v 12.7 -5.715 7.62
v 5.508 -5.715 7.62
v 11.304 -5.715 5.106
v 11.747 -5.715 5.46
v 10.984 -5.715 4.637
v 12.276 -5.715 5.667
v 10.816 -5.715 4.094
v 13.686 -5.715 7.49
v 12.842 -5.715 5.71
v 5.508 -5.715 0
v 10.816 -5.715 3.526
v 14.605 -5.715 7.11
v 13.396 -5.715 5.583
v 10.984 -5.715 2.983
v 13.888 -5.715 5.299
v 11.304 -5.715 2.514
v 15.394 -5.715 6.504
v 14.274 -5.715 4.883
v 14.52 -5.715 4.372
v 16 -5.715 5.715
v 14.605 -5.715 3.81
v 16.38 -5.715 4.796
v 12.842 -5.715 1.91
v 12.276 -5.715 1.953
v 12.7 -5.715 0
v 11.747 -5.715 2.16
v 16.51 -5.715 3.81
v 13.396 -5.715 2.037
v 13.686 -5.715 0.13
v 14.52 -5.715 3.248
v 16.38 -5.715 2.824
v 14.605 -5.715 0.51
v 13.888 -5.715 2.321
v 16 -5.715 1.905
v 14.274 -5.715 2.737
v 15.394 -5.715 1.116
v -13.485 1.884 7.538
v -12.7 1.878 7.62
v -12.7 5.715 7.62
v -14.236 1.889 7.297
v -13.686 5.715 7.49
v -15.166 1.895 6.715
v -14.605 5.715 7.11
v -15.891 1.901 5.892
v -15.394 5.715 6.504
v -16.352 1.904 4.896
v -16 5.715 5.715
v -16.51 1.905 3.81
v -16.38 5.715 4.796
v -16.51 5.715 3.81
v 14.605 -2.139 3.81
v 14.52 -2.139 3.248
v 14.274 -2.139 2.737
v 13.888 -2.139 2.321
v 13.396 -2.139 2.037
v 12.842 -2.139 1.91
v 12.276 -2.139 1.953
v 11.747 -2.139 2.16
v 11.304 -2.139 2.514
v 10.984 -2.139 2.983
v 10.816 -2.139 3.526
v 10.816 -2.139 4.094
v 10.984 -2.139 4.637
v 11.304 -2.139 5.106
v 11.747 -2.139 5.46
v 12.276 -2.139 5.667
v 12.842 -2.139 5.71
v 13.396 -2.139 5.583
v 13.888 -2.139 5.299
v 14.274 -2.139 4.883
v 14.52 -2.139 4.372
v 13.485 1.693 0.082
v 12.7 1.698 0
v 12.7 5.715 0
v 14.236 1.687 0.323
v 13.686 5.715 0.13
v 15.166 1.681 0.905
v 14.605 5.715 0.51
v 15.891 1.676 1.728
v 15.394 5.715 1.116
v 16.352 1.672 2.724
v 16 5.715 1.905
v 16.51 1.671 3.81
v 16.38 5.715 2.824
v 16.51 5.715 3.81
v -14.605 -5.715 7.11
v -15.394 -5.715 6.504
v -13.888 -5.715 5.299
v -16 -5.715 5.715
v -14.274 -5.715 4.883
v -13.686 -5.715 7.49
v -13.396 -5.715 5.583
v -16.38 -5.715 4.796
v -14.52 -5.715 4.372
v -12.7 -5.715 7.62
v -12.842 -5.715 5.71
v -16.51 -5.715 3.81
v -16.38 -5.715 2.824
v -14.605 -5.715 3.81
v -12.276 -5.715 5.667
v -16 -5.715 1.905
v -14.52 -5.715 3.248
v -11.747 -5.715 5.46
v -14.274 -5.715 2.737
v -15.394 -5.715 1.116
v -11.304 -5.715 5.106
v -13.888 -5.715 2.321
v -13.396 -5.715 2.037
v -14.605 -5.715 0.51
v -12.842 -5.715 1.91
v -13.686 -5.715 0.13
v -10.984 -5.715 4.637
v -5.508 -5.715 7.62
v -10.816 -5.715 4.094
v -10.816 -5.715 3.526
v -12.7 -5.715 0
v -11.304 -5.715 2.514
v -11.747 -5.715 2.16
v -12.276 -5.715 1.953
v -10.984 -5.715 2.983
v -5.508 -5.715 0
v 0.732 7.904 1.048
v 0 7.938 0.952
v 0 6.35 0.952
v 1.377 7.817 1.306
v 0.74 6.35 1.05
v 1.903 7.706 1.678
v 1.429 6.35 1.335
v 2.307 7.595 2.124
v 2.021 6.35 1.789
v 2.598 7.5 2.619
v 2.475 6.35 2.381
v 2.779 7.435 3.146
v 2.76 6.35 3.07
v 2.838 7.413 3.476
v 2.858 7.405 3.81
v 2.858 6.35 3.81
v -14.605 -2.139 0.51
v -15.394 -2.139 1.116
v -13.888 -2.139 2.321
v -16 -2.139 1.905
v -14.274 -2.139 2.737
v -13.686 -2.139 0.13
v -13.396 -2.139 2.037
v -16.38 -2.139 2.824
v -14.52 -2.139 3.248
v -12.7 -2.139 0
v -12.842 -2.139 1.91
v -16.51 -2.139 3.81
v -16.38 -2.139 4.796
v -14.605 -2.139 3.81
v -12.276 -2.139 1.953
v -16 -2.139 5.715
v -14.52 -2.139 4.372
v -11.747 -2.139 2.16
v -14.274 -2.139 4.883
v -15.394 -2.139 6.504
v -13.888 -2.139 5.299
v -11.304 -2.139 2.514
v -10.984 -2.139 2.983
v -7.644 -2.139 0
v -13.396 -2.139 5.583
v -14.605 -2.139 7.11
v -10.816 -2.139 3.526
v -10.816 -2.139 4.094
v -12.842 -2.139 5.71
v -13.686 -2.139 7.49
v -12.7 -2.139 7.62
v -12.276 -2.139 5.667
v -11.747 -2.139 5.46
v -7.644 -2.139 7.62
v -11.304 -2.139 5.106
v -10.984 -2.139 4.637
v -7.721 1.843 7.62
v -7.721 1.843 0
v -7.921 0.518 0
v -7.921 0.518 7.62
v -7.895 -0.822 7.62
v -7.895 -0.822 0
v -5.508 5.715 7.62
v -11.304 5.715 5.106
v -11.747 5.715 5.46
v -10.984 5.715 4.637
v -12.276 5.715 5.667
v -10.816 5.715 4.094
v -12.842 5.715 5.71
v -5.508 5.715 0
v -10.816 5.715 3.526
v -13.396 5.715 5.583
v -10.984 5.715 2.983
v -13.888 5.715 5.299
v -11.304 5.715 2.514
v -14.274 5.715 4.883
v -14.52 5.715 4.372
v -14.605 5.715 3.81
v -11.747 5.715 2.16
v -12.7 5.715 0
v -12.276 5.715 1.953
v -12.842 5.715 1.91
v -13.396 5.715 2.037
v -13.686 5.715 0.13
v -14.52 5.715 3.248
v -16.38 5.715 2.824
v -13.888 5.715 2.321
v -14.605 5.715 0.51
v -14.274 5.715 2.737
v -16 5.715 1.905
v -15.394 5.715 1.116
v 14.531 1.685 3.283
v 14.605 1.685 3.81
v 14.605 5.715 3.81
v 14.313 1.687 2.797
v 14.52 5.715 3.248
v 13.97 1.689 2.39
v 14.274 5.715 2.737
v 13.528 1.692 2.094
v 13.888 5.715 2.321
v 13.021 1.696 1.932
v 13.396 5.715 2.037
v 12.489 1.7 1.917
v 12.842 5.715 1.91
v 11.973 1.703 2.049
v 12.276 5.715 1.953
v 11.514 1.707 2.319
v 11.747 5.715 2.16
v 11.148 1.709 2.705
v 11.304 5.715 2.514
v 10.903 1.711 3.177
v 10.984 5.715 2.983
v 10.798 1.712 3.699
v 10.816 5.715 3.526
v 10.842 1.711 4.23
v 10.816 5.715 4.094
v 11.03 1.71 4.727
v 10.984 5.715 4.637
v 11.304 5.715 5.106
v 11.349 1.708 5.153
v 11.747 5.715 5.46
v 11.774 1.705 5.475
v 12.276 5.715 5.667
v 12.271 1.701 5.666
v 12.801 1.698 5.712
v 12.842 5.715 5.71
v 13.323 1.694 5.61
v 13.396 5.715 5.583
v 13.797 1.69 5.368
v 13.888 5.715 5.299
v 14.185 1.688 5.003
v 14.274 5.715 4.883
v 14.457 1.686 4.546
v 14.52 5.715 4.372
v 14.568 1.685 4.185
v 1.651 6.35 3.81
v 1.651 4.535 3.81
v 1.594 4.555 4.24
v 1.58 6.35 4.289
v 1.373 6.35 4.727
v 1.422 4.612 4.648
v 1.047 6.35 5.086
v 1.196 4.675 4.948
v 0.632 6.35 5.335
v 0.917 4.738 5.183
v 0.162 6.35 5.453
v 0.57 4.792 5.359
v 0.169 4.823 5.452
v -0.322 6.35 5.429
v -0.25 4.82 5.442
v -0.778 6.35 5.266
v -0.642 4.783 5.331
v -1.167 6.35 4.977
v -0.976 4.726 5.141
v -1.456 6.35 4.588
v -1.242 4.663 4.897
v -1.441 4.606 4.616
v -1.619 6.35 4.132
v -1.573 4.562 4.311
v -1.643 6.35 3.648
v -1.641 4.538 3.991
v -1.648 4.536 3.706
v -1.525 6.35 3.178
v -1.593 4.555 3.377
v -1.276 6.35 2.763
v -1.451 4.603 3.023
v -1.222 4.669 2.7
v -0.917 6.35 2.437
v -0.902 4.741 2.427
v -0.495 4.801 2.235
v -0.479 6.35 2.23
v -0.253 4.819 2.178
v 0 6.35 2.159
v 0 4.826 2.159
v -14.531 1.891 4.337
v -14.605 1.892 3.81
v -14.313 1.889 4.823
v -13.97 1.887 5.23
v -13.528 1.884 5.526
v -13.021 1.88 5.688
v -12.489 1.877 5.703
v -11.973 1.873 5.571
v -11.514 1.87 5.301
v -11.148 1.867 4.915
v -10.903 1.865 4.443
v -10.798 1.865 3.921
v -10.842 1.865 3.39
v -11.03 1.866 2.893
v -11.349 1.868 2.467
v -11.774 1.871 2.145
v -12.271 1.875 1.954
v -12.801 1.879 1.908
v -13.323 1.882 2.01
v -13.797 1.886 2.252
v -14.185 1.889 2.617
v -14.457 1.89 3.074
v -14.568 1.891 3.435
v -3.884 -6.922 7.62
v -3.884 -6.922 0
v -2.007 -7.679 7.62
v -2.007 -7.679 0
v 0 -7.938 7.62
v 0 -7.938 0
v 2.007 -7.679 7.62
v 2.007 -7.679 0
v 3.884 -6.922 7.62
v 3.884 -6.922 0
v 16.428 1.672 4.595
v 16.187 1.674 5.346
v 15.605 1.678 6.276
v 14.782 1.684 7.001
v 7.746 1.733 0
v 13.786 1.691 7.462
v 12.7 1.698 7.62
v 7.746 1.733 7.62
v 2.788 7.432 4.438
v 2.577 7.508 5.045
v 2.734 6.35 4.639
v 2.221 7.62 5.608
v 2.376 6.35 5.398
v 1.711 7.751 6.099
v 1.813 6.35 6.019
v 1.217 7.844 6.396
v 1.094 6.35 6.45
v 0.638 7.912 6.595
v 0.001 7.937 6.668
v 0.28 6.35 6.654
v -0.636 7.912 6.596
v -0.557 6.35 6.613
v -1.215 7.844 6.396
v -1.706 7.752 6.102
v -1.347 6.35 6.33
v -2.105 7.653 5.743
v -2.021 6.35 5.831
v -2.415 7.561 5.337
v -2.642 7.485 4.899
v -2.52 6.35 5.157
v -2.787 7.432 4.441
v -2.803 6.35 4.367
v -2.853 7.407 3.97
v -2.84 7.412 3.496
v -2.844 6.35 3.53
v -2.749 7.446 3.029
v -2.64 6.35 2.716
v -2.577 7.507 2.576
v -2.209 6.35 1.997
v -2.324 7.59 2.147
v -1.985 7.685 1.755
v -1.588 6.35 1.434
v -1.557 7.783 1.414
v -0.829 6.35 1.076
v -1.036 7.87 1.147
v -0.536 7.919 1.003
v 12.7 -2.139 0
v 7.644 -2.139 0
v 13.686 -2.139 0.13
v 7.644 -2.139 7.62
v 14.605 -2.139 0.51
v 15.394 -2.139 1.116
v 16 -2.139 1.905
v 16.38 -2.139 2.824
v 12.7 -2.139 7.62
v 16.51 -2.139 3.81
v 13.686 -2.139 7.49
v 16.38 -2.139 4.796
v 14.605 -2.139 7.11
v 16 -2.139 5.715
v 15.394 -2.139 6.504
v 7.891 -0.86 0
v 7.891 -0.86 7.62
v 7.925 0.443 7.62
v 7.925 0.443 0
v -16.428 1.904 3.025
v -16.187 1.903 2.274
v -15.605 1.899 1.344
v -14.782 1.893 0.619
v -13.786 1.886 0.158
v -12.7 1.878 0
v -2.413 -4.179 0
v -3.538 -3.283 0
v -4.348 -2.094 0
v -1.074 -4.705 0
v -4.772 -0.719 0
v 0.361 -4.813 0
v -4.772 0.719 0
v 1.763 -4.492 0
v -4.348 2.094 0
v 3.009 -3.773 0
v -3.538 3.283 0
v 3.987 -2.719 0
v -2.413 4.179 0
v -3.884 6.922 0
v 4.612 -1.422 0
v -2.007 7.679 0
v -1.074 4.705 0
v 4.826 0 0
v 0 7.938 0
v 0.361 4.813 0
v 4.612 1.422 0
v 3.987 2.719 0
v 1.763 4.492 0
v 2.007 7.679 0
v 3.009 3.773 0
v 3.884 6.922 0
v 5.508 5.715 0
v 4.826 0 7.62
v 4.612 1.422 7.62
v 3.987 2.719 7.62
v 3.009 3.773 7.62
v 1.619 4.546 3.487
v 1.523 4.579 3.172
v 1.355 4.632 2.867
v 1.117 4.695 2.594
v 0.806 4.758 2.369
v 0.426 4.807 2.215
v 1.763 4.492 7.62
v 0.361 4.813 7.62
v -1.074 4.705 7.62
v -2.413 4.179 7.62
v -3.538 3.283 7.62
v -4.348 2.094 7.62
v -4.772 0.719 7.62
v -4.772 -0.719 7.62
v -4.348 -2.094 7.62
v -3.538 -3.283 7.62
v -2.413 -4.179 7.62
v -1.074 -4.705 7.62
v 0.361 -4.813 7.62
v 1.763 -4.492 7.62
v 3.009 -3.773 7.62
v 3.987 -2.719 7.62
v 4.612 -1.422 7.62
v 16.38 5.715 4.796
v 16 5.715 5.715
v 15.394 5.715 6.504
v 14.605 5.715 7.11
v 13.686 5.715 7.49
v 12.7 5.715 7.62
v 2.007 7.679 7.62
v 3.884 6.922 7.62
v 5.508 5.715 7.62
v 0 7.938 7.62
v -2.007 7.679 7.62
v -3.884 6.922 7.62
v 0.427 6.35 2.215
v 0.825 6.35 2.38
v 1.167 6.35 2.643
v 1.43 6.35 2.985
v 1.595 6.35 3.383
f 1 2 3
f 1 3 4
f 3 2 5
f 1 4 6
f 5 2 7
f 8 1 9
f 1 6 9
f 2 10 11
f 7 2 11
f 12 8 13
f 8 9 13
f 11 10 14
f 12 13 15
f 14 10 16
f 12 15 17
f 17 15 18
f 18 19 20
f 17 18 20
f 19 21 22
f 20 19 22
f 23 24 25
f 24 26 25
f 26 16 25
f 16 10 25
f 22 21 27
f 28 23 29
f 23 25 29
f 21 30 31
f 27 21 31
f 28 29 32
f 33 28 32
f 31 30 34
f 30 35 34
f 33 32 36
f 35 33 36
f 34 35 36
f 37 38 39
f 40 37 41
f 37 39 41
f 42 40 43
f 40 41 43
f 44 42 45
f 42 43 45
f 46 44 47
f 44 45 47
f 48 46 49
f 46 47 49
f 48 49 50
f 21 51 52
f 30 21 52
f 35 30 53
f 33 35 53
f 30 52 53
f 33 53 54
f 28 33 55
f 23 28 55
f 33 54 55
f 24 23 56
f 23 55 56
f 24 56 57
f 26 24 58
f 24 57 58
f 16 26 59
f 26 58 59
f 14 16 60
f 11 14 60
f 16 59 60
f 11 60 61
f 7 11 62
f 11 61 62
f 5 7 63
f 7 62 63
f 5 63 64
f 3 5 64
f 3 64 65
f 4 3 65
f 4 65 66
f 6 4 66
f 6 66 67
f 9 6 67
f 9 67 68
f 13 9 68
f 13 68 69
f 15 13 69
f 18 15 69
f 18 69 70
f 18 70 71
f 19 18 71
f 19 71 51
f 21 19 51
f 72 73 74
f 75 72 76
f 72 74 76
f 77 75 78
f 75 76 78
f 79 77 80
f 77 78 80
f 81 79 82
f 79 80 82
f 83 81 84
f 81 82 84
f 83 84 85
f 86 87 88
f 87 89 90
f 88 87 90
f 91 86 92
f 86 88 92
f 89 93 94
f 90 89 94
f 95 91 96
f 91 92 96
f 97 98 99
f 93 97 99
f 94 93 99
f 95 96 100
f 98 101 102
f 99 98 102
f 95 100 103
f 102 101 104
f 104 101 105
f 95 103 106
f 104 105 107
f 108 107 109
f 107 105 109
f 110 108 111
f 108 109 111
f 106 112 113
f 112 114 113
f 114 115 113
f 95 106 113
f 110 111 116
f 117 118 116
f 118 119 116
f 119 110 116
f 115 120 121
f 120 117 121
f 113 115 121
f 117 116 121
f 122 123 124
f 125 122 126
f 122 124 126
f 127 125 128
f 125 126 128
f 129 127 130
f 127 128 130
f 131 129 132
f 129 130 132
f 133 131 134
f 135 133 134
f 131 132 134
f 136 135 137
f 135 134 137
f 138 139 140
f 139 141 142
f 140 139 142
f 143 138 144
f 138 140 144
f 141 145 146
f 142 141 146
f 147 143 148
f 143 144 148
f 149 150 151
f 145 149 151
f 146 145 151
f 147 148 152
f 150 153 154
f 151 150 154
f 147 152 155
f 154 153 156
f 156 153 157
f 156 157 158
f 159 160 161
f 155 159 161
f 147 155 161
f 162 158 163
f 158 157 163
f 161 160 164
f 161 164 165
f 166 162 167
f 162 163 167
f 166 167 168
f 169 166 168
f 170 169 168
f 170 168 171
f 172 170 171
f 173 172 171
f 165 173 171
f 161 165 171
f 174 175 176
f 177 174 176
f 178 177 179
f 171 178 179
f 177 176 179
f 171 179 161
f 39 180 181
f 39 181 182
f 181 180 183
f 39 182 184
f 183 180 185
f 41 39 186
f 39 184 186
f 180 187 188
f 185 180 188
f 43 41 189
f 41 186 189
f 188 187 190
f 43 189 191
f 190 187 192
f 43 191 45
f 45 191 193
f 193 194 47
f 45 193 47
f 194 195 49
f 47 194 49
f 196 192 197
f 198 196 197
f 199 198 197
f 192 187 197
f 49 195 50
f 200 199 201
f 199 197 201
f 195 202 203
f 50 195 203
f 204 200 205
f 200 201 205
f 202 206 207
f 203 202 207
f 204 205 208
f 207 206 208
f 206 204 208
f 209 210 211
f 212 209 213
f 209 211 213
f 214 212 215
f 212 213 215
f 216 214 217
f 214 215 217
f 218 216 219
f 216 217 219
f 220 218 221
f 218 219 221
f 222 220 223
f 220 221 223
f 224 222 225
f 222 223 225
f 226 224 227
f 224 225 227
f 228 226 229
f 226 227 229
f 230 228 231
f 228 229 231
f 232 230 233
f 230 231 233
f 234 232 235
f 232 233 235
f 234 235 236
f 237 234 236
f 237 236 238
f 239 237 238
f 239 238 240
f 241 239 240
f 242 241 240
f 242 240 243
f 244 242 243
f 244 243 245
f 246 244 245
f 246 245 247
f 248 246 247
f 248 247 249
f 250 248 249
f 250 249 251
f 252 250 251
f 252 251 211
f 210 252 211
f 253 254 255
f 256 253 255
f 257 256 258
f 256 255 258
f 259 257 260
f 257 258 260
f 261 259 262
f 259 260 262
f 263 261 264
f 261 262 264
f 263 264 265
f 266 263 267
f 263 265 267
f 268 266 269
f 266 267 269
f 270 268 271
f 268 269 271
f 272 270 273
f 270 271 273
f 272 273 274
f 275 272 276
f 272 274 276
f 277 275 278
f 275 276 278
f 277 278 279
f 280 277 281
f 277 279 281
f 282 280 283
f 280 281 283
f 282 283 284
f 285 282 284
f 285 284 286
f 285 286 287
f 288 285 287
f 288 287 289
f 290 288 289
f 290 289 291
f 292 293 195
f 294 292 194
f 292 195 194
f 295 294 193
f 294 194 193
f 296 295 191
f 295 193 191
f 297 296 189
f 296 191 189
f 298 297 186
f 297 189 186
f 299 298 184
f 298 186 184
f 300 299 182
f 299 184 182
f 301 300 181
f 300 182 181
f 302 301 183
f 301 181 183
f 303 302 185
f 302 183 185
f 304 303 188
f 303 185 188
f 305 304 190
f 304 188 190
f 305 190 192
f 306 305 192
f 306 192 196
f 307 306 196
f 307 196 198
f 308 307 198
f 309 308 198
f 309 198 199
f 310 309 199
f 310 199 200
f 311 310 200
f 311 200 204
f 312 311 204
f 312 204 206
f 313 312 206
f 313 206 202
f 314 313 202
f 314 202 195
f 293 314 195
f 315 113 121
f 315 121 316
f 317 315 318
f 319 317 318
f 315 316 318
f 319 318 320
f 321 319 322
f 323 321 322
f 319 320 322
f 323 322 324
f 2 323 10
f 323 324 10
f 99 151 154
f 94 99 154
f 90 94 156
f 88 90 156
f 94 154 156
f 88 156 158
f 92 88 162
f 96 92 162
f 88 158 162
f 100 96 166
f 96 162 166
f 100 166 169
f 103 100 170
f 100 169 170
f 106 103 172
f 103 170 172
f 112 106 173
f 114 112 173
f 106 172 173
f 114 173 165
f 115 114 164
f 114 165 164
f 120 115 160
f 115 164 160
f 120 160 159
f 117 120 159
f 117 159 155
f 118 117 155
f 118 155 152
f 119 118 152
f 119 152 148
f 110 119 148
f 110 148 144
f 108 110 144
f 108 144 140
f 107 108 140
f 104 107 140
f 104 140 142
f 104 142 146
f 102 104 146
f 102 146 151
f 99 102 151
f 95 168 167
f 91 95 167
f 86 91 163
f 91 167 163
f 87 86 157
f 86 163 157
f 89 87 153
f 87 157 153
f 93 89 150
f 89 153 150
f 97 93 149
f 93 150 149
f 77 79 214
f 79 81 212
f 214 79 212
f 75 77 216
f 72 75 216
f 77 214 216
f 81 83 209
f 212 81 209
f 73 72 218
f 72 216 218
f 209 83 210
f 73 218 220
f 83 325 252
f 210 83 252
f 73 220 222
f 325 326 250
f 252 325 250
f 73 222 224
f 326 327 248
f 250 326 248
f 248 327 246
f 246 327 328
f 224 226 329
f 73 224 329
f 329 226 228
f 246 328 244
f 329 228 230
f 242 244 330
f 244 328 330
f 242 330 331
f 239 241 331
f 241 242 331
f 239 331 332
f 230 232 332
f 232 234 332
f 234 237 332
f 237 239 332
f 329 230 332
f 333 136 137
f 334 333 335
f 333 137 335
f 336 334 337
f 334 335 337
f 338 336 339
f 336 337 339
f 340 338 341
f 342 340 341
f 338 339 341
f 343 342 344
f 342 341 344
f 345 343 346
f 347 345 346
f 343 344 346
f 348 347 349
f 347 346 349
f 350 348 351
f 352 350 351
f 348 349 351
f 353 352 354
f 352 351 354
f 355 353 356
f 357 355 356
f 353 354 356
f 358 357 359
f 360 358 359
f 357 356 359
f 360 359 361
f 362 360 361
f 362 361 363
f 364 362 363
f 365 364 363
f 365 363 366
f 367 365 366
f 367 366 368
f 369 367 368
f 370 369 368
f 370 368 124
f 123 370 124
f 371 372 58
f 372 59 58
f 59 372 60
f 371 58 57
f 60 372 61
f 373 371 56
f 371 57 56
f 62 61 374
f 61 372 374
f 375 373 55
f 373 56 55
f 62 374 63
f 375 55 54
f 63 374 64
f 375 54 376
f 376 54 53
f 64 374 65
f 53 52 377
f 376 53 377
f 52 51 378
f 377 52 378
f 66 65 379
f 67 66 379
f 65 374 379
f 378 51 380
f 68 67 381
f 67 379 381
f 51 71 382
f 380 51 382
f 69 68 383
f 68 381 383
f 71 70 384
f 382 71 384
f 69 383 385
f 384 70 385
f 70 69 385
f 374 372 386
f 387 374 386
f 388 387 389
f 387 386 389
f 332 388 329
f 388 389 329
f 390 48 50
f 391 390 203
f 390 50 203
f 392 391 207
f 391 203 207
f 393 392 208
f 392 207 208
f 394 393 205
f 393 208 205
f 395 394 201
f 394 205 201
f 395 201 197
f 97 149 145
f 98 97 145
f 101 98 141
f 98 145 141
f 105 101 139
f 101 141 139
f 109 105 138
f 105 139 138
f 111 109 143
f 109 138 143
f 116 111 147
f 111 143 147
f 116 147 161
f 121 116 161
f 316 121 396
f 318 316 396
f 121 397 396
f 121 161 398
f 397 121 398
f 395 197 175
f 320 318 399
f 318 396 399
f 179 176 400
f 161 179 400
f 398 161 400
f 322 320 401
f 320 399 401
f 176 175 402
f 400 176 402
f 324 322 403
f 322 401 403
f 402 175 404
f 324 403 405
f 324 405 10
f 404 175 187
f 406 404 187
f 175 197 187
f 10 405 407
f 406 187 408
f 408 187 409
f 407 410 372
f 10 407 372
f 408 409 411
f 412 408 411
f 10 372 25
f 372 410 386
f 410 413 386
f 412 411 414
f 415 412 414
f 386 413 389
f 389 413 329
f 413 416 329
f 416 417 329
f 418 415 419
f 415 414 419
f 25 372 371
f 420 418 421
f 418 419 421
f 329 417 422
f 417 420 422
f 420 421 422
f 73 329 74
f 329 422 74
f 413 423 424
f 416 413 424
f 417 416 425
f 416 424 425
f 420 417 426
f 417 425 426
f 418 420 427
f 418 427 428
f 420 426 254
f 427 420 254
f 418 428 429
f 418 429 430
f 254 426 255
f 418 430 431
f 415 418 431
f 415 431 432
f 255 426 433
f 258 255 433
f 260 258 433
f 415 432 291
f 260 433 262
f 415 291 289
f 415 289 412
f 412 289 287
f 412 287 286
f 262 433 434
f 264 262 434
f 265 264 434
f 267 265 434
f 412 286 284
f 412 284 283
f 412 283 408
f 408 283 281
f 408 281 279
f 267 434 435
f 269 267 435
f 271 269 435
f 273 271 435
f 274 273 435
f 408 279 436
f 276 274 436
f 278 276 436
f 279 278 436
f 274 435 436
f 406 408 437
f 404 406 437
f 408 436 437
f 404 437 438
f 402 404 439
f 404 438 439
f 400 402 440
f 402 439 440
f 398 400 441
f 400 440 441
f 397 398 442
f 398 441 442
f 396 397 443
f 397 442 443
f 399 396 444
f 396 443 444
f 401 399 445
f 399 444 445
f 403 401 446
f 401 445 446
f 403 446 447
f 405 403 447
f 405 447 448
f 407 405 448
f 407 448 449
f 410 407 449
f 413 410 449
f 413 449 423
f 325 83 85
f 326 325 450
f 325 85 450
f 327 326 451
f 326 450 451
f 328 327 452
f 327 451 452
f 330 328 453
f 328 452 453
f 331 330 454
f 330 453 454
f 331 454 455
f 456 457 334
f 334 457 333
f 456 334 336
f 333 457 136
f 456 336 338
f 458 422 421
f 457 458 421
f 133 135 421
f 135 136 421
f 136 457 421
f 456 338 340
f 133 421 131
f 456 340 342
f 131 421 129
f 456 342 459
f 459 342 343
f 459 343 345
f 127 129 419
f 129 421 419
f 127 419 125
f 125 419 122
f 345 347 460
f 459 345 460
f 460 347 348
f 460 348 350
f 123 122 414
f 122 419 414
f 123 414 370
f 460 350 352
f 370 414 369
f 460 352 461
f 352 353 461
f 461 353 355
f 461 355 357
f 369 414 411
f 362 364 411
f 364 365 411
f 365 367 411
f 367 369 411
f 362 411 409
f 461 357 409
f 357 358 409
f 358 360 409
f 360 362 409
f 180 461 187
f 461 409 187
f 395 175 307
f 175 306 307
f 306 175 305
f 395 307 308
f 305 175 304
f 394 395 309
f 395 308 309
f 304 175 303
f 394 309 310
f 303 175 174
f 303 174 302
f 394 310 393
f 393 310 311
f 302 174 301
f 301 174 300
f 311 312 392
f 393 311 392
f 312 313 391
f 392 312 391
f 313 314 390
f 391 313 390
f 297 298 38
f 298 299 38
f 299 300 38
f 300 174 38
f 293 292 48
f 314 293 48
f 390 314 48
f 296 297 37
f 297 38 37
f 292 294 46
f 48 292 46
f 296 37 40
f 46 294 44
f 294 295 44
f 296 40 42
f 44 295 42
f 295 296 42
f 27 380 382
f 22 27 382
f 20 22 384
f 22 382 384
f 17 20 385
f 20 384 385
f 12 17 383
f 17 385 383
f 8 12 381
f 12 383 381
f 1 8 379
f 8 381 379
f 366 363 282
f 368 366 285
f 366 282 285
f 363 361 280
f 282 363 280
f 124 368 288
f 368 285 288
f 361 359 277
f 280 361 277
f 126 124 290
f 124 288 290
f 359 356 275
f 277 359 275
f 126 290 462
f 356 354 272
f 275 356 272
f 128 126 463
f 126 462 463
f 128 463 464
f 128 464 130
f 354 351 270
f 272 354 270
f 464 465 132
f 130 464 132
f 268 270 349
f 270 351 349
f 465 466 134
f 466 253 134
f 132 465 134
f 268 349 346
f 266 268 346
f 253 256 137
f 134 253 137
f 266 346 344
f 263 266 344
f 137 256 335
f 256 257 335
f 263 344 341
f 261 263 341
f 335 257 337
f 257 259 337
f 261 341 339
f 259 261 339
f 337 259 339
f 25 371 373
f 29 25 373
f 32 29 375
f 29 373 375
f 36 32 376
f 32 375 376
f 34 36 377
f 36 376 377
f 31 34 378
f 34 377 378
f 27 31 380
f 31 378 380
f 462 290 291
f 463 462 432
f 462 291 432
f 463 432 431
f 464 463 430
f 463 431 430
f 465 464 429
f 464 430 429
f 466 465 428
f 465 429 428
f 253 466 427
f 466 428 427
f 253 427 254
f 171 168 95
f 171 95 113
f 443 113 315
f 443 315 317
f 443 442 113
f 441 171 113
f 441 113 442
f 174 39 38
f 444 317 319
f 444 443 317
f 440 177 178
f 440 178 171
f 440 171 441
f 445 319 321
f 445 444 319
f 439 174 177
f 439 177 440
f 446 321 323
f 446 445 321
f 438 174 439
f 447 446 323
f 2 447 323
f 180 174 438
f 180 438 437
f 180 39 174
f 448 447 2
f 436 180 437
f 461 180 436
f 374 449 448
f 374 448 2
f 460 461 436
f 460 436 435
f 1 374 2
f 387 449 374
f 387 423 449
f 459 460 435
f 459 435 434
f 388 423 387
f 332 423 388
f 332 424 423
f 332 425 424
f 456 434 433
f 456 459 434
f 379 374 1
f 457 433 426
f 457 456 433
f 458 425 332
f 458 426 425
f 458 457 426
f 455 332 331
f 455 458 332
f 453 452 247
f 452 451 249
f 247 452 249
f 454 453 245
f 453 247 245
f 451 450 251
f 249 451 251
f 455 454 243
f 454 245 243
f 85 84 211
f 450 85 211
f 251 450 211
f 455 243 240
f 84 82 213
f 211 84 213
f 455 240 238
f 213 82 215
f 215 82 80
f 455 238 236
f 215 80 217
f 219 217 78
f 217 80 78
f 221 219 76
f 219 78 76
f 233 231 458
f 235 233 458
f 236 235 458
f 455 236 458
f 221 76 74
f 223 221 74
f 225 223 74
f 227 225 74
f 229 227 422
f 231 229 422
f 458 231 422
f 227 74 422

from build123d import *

# Parameters (mm, degrees)
F1_DEPTH  = 7.62
F3_DEPTH  = 7.62
F4_R      = 1.905
F5_DEPTH  = 11.431
F6_R      = 7.9375
F7_DEPTH  = 7.62
F8_R      = 4.826
F9_DEPTH  = 25.4
F11_DEPTH = 25.4
F14_DEPTH = 25.4


with BuildPart() as f1:
    # F0 (on Top) → F1 (new body)
    with BuildSketch(Plane.XY):
        Polygon((-16.51, -5.715), (0, -5.715), (16.51, -5.715), (16.51, 5.715), (-16.51, 5.715), align=None)
    extrude(amount=F1_DEPTH)

    # F2 (on face) → F3 (cut)
    with BuildSketch(Plane.XY.offset(7.62)):
        Polygon((-16.51, 1.905), (-16.51, 0), (-16.51, -2.138732), (16.51, -2.138732), (16.51, 1.671268), align=None)
    extrude(amount=-F3_DEPTH, mode=Mode.SUBTRACT)

    # F4 (on face) → F5 (cut, through all)
    with BuildSketch(Plane(origin=(0, 5.715, 0), x_dir=(-1, 0, 0), z_dir=(0, 1, 0))):
        with Locations((12.7, 3.81)):
            Circle(F4_R)
        with BuildLine():
            Line((16.51, 0), (16.51, 3.81))
            ThreePointArc((16.51, 3.81), (15.394077, 1.115923), (12.7, 0))
            Line((12.7, 0), (16.51, 0))
        make_face()
        with BuildLine():
            ThreePointArc((12.7, 7.62), (15.394077, 6.504077), (16.51, 3.81))
            Line((16.51, 3.81), (16.51, 7.62))
            Line((16.51, 7.62), (12.7, 7.62))
        make_face()
        with BuildLine():
            ThreePointArc((-10.795, 3.81), (-12.7, 5.715), (-14.605, 3.81))
            ThreePointArc((-14.605, 3.81), (-12.7, 1.905), (-10.795, 3.81))
        make_face()
        with BuildLine():
            Line((-16.51, 7.62), (-16.51, 3.81))
            ThreePointArc((-16.51, 3.81), (-15.394077, 6.504077), (-12.7, 7.62))
            Line((-12.7, 7.62), (-16.51, 7.62))
        make_face()
        with BuildLine():
            ThreePointArc((-12.7, 0), (-15.394077, 1.115923), (-16.51, 3.81))
            Line((-16.51, 3.81), (-16.51, 0))
            Line((-16.51, 0), (-12.7, 0))
        make_face()
    extrude(amount=-F5_DEPTH, mode=Mode.SUBTRACT)

    # F6 (on Top) → F7 (join, through all)
    with BuildSketch(Plane.XY):
        Circle(F6_R)
    extrude(amount=F7_DEPTH)

    # F8 (on face) → F9 (cut)
    with BuildSketch(Plane.XY.offset(7.62)):
        Circle(F8_R)
    extrude(amount=-F9_DEPTH, mode=Mode.SUBTRACT)

    # F10 (on Front) → F11 (cut)
    with BuildSketch(Plane.XZ):
        with BuildLine():
            ThreePointArc((0, 2.159), (1.167433, 2.642567), (1.651, 3.81))
            ThreePointArc((1.651, 3.81), (-1.167433, 4.977433), (0, 2.159))
        make_face()
    extrude(amount=-F11_DEPTH, mode=Mode.SUBTRACT)

    # F13 (on offset) → F14 (cut)
    with BuildSketch(Plane.XZ.offset(-6.35)):
        with BuildLine():
            ThreePointArc((0, 0.9525), (2.020558, 1.789442), (2.8575, 3.81))
            ThreePointArc((2.8575, 3.81), (-2.020558, 5.830558), (0, 0.9525))
        make_face()
    extrude(amount=-F14_DEPTH, mode=Mode.SUBTRACT)


solid = f1.part
